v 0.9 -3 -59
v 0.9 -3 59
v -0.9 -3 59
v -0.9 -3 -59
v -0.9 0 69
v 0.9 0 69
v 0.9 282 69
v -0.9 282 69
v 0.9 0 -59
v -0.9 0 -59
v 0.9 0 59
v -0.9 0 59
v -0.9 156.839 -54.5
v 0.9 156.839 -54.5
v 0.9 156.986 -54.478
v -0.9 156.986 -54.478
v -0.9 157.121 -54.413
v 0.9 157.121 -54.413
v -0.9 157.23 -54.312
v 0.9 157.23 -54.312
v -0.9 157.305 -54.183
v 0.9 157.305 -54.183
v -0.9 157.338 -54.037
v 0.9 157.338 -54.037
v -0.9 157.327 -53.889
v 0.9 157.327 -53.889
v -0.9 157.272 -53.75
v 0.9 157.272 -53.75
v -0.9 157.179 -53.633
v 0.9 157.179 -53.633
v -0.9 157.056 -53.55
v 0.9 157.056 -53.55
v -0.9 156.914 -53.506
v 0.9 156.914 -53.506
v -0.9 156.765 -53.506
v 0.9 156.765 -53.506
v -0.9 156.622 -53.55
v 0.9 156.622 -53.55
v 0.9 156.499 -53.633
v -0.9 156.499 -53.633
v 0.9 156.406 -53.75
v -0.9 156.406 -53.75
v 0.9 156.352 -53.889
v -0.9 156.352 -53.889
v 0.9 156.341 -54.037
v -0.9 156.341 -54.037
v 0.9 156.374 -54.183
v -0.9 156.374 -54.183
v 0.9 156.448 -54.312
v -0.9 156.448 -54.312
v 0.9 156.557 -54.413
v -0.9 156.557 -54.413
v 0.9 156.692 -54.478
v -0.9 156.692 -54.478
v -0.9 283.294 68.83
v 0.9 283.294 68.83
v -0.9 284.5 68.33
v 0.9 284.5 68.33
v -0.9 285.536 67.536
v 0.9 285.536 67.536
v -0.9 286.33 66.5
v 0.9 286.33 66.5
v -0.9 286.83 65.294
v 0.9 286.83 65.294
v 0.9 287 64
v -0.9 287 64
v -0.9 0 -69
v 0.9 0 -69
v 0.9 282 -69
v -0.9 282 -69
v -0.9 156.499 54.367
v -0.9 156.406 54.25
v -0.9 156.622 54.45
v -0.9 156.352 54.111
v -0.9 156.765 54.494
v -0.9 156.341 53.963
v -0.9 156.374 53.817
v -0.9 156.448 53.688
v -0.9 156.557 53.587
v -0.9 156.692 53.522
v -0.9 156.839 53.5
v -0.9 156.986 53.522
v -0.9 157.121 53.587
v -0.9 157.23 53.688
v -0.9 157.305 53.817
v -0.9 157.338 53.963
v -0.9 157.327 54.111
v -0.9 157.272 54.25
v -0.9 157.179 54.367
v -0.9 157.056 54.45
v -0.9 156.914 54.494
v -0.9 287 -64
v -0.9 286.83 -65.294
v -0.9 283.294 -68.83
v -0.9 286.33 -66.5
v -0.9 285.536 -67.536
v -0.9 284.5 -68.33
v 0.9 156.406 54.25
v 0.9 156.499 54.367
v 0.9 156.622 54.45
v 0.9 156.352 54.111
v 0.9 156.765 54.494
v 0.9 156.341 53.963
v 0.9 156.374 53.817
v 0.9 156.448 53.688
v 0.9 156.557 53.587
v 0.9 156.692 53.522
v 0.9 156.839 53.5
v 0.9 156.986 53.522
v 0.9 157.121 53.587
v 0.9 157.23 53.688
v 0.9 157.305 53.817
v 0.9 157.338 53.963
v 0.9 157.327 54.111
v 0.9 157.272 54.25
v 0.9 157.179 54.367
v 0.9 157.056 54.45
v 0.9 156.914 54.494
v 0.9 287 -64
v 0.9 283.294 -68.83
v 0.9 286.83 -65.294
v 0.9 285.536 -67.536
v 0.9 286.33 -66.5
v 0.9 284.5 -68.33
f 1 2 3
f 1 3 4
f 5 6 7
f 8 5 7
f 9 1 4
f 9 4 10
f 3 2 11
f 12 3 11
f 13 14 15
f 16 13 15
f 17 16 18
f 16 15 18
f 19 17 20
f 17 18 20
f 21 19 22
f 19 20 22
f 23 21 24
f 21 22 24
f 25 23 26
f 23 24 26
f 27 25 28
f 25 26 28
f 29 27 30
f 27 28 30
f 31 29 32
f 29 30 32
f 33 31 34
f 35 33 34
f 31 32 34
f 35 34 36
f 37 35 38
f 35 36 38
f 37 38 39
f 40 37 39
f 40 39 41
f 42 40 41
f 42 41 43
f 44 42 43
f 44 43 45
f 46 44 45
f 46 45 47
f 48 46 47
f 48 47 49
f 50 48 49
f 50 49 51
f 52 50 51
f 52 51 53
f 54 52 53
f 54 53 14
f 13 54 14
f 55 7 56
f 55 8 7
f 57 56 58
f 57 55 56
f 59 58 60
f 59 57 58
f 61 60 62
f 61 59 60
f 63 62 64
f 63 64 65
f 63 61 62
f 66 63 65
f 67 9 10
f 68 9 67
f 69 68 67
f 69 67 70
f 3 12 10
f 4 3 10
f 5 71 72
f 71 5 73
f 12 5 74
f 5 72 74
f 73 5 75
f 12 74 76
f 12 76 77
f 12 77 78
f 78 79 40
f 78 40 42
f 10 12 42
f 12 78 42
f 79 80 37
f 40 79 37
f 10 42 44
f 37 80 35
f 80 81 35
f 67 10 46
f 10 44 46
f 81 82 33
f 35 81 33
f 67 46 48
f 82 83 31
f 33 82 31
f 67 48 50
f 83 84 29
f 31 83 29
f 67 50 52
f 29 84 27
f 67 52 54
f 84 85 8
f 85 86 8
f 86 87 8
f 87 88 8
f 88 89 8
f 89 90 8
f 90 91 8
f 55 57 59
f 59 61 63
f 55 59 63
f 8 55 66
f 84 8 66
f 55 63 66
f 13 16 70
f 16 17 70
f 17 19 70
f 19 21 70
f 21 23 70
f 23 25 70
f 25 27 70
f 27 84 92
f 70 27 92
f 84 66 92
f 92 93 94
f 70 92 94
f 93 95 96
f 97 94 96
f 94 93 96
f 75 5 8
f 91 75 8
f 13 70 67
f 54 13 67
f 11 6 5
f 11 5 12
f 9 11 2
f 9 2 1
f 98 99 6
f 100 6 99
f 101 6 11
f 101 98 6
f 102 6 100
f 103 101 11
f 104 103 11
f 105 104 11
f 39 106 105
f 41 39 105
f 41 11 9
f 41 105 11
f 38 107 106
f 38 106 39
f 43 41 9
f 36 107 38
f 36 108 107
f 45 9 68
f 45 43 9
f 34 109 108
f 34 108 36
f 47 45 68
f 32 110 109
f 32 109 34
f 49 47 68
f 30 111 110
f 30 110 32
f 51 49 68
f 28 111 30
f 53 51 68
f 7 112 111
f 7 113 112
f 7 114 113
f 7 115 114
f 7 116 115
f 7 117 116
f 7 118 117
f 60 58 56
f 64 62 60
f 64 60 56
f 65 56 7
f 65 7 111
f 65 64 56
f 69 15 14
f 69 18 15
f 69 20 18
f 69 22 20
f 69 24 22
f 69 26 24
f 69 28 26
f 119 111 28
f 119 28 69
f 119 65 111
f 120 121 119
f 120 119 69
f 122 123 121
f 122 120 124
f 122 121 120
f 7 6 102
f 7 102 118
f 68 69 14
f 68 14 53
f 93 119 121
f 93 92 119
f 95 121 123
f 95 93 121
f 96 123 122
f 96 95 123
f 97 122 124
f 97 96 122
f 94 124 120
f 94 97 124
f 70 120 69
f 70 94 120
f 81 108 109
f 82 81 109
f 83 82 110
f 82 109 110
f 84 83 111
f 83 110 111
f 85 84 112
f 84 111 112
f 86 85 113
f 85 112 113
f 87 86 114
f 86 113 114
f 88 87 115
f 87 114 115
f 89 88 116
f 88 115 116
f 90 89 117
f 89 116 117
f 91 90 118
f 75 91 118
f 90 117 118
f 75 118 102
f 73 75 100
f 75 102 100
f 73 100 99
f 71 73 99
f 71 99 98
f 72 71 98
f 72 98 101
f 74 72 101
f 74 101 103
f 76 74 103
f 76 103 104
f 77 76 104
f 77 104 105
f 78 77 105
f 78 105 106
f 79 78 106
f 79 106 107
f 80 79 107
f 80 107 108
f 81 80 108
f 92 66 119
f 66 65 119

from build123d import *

# Parameters (mm, degrees)
SKETCH1_W           = 138
SKETCH1_H           = 290
BOSS_EXTRUDE1_DEPTH = 0.9
SKETCH2_W           = 24.039147707
SKETCH2_H           = 8.338300827
CUT_EXTRUDE1_DEPTH  = 3
SKETCH4_R           = 0.5
CUT_EXTRUDE2_DEPTH  = 10
FILLET1_R           = 5


with BuildPart() as part:
    # Sketch1 → Boss-Extrude1 (new body, symmetric)
    with BuildSketch(Plane(origin=(0, 0, 0), x_dir=(0, 0, -1), z_dir=(1, 0, 0))):
        with Locations((0, 142)):
            Rectangle(SKETCH1_W, SKETCH1_H)
    extrude(amount=BOSS_EXTRUDE1_DEPTH, both=True)

    # Sketch2 → Cut-Extrude1 (cut)
    with BuildSketch(Plane(origin=(0.9, 0, 0), x_dir=(0, 0, -1), z_dir=(1, 0, 0))):
        with Locations((71.019573854, -4.169150414)):
            Rectangle(SKETCH2_W, SKETCH2_H)
        with Locations((-71.019573854, -4.169150414)):
            Rectangle(SKETCH2_W, SKETCH2_H)
    extrude(amount=-CUT_EXTRUDE1_DEPTH, mode=Mode.SUBTRACT)

    # Sketch4 → Cut-Extrude2 (cut)
    with BuildSketch(Plane(origin=(0.9, 0, 0), x_dir=(0, 0, -1), z_dir=(1, 0, 0))):
        with Locations((-54, 156.83912074)):
            Circle(SKETCH4_R)
        with Locations((54, 156.83912074)):
            Circle(SKETCH4_R)
    extrude(amount=-CUT_EXTRUDE2_DEPTH, mode=Mode.SUBTRACT)

    # Fillet1
    fillet1_edges = [part.edges().sort_by_distance(p)[0] for p in [
        (0, 287, 69),
        (0, 287, -69),
    ]]
    fillet(fillet1_edges, radius=FILLET1_R)


solid = part.part
